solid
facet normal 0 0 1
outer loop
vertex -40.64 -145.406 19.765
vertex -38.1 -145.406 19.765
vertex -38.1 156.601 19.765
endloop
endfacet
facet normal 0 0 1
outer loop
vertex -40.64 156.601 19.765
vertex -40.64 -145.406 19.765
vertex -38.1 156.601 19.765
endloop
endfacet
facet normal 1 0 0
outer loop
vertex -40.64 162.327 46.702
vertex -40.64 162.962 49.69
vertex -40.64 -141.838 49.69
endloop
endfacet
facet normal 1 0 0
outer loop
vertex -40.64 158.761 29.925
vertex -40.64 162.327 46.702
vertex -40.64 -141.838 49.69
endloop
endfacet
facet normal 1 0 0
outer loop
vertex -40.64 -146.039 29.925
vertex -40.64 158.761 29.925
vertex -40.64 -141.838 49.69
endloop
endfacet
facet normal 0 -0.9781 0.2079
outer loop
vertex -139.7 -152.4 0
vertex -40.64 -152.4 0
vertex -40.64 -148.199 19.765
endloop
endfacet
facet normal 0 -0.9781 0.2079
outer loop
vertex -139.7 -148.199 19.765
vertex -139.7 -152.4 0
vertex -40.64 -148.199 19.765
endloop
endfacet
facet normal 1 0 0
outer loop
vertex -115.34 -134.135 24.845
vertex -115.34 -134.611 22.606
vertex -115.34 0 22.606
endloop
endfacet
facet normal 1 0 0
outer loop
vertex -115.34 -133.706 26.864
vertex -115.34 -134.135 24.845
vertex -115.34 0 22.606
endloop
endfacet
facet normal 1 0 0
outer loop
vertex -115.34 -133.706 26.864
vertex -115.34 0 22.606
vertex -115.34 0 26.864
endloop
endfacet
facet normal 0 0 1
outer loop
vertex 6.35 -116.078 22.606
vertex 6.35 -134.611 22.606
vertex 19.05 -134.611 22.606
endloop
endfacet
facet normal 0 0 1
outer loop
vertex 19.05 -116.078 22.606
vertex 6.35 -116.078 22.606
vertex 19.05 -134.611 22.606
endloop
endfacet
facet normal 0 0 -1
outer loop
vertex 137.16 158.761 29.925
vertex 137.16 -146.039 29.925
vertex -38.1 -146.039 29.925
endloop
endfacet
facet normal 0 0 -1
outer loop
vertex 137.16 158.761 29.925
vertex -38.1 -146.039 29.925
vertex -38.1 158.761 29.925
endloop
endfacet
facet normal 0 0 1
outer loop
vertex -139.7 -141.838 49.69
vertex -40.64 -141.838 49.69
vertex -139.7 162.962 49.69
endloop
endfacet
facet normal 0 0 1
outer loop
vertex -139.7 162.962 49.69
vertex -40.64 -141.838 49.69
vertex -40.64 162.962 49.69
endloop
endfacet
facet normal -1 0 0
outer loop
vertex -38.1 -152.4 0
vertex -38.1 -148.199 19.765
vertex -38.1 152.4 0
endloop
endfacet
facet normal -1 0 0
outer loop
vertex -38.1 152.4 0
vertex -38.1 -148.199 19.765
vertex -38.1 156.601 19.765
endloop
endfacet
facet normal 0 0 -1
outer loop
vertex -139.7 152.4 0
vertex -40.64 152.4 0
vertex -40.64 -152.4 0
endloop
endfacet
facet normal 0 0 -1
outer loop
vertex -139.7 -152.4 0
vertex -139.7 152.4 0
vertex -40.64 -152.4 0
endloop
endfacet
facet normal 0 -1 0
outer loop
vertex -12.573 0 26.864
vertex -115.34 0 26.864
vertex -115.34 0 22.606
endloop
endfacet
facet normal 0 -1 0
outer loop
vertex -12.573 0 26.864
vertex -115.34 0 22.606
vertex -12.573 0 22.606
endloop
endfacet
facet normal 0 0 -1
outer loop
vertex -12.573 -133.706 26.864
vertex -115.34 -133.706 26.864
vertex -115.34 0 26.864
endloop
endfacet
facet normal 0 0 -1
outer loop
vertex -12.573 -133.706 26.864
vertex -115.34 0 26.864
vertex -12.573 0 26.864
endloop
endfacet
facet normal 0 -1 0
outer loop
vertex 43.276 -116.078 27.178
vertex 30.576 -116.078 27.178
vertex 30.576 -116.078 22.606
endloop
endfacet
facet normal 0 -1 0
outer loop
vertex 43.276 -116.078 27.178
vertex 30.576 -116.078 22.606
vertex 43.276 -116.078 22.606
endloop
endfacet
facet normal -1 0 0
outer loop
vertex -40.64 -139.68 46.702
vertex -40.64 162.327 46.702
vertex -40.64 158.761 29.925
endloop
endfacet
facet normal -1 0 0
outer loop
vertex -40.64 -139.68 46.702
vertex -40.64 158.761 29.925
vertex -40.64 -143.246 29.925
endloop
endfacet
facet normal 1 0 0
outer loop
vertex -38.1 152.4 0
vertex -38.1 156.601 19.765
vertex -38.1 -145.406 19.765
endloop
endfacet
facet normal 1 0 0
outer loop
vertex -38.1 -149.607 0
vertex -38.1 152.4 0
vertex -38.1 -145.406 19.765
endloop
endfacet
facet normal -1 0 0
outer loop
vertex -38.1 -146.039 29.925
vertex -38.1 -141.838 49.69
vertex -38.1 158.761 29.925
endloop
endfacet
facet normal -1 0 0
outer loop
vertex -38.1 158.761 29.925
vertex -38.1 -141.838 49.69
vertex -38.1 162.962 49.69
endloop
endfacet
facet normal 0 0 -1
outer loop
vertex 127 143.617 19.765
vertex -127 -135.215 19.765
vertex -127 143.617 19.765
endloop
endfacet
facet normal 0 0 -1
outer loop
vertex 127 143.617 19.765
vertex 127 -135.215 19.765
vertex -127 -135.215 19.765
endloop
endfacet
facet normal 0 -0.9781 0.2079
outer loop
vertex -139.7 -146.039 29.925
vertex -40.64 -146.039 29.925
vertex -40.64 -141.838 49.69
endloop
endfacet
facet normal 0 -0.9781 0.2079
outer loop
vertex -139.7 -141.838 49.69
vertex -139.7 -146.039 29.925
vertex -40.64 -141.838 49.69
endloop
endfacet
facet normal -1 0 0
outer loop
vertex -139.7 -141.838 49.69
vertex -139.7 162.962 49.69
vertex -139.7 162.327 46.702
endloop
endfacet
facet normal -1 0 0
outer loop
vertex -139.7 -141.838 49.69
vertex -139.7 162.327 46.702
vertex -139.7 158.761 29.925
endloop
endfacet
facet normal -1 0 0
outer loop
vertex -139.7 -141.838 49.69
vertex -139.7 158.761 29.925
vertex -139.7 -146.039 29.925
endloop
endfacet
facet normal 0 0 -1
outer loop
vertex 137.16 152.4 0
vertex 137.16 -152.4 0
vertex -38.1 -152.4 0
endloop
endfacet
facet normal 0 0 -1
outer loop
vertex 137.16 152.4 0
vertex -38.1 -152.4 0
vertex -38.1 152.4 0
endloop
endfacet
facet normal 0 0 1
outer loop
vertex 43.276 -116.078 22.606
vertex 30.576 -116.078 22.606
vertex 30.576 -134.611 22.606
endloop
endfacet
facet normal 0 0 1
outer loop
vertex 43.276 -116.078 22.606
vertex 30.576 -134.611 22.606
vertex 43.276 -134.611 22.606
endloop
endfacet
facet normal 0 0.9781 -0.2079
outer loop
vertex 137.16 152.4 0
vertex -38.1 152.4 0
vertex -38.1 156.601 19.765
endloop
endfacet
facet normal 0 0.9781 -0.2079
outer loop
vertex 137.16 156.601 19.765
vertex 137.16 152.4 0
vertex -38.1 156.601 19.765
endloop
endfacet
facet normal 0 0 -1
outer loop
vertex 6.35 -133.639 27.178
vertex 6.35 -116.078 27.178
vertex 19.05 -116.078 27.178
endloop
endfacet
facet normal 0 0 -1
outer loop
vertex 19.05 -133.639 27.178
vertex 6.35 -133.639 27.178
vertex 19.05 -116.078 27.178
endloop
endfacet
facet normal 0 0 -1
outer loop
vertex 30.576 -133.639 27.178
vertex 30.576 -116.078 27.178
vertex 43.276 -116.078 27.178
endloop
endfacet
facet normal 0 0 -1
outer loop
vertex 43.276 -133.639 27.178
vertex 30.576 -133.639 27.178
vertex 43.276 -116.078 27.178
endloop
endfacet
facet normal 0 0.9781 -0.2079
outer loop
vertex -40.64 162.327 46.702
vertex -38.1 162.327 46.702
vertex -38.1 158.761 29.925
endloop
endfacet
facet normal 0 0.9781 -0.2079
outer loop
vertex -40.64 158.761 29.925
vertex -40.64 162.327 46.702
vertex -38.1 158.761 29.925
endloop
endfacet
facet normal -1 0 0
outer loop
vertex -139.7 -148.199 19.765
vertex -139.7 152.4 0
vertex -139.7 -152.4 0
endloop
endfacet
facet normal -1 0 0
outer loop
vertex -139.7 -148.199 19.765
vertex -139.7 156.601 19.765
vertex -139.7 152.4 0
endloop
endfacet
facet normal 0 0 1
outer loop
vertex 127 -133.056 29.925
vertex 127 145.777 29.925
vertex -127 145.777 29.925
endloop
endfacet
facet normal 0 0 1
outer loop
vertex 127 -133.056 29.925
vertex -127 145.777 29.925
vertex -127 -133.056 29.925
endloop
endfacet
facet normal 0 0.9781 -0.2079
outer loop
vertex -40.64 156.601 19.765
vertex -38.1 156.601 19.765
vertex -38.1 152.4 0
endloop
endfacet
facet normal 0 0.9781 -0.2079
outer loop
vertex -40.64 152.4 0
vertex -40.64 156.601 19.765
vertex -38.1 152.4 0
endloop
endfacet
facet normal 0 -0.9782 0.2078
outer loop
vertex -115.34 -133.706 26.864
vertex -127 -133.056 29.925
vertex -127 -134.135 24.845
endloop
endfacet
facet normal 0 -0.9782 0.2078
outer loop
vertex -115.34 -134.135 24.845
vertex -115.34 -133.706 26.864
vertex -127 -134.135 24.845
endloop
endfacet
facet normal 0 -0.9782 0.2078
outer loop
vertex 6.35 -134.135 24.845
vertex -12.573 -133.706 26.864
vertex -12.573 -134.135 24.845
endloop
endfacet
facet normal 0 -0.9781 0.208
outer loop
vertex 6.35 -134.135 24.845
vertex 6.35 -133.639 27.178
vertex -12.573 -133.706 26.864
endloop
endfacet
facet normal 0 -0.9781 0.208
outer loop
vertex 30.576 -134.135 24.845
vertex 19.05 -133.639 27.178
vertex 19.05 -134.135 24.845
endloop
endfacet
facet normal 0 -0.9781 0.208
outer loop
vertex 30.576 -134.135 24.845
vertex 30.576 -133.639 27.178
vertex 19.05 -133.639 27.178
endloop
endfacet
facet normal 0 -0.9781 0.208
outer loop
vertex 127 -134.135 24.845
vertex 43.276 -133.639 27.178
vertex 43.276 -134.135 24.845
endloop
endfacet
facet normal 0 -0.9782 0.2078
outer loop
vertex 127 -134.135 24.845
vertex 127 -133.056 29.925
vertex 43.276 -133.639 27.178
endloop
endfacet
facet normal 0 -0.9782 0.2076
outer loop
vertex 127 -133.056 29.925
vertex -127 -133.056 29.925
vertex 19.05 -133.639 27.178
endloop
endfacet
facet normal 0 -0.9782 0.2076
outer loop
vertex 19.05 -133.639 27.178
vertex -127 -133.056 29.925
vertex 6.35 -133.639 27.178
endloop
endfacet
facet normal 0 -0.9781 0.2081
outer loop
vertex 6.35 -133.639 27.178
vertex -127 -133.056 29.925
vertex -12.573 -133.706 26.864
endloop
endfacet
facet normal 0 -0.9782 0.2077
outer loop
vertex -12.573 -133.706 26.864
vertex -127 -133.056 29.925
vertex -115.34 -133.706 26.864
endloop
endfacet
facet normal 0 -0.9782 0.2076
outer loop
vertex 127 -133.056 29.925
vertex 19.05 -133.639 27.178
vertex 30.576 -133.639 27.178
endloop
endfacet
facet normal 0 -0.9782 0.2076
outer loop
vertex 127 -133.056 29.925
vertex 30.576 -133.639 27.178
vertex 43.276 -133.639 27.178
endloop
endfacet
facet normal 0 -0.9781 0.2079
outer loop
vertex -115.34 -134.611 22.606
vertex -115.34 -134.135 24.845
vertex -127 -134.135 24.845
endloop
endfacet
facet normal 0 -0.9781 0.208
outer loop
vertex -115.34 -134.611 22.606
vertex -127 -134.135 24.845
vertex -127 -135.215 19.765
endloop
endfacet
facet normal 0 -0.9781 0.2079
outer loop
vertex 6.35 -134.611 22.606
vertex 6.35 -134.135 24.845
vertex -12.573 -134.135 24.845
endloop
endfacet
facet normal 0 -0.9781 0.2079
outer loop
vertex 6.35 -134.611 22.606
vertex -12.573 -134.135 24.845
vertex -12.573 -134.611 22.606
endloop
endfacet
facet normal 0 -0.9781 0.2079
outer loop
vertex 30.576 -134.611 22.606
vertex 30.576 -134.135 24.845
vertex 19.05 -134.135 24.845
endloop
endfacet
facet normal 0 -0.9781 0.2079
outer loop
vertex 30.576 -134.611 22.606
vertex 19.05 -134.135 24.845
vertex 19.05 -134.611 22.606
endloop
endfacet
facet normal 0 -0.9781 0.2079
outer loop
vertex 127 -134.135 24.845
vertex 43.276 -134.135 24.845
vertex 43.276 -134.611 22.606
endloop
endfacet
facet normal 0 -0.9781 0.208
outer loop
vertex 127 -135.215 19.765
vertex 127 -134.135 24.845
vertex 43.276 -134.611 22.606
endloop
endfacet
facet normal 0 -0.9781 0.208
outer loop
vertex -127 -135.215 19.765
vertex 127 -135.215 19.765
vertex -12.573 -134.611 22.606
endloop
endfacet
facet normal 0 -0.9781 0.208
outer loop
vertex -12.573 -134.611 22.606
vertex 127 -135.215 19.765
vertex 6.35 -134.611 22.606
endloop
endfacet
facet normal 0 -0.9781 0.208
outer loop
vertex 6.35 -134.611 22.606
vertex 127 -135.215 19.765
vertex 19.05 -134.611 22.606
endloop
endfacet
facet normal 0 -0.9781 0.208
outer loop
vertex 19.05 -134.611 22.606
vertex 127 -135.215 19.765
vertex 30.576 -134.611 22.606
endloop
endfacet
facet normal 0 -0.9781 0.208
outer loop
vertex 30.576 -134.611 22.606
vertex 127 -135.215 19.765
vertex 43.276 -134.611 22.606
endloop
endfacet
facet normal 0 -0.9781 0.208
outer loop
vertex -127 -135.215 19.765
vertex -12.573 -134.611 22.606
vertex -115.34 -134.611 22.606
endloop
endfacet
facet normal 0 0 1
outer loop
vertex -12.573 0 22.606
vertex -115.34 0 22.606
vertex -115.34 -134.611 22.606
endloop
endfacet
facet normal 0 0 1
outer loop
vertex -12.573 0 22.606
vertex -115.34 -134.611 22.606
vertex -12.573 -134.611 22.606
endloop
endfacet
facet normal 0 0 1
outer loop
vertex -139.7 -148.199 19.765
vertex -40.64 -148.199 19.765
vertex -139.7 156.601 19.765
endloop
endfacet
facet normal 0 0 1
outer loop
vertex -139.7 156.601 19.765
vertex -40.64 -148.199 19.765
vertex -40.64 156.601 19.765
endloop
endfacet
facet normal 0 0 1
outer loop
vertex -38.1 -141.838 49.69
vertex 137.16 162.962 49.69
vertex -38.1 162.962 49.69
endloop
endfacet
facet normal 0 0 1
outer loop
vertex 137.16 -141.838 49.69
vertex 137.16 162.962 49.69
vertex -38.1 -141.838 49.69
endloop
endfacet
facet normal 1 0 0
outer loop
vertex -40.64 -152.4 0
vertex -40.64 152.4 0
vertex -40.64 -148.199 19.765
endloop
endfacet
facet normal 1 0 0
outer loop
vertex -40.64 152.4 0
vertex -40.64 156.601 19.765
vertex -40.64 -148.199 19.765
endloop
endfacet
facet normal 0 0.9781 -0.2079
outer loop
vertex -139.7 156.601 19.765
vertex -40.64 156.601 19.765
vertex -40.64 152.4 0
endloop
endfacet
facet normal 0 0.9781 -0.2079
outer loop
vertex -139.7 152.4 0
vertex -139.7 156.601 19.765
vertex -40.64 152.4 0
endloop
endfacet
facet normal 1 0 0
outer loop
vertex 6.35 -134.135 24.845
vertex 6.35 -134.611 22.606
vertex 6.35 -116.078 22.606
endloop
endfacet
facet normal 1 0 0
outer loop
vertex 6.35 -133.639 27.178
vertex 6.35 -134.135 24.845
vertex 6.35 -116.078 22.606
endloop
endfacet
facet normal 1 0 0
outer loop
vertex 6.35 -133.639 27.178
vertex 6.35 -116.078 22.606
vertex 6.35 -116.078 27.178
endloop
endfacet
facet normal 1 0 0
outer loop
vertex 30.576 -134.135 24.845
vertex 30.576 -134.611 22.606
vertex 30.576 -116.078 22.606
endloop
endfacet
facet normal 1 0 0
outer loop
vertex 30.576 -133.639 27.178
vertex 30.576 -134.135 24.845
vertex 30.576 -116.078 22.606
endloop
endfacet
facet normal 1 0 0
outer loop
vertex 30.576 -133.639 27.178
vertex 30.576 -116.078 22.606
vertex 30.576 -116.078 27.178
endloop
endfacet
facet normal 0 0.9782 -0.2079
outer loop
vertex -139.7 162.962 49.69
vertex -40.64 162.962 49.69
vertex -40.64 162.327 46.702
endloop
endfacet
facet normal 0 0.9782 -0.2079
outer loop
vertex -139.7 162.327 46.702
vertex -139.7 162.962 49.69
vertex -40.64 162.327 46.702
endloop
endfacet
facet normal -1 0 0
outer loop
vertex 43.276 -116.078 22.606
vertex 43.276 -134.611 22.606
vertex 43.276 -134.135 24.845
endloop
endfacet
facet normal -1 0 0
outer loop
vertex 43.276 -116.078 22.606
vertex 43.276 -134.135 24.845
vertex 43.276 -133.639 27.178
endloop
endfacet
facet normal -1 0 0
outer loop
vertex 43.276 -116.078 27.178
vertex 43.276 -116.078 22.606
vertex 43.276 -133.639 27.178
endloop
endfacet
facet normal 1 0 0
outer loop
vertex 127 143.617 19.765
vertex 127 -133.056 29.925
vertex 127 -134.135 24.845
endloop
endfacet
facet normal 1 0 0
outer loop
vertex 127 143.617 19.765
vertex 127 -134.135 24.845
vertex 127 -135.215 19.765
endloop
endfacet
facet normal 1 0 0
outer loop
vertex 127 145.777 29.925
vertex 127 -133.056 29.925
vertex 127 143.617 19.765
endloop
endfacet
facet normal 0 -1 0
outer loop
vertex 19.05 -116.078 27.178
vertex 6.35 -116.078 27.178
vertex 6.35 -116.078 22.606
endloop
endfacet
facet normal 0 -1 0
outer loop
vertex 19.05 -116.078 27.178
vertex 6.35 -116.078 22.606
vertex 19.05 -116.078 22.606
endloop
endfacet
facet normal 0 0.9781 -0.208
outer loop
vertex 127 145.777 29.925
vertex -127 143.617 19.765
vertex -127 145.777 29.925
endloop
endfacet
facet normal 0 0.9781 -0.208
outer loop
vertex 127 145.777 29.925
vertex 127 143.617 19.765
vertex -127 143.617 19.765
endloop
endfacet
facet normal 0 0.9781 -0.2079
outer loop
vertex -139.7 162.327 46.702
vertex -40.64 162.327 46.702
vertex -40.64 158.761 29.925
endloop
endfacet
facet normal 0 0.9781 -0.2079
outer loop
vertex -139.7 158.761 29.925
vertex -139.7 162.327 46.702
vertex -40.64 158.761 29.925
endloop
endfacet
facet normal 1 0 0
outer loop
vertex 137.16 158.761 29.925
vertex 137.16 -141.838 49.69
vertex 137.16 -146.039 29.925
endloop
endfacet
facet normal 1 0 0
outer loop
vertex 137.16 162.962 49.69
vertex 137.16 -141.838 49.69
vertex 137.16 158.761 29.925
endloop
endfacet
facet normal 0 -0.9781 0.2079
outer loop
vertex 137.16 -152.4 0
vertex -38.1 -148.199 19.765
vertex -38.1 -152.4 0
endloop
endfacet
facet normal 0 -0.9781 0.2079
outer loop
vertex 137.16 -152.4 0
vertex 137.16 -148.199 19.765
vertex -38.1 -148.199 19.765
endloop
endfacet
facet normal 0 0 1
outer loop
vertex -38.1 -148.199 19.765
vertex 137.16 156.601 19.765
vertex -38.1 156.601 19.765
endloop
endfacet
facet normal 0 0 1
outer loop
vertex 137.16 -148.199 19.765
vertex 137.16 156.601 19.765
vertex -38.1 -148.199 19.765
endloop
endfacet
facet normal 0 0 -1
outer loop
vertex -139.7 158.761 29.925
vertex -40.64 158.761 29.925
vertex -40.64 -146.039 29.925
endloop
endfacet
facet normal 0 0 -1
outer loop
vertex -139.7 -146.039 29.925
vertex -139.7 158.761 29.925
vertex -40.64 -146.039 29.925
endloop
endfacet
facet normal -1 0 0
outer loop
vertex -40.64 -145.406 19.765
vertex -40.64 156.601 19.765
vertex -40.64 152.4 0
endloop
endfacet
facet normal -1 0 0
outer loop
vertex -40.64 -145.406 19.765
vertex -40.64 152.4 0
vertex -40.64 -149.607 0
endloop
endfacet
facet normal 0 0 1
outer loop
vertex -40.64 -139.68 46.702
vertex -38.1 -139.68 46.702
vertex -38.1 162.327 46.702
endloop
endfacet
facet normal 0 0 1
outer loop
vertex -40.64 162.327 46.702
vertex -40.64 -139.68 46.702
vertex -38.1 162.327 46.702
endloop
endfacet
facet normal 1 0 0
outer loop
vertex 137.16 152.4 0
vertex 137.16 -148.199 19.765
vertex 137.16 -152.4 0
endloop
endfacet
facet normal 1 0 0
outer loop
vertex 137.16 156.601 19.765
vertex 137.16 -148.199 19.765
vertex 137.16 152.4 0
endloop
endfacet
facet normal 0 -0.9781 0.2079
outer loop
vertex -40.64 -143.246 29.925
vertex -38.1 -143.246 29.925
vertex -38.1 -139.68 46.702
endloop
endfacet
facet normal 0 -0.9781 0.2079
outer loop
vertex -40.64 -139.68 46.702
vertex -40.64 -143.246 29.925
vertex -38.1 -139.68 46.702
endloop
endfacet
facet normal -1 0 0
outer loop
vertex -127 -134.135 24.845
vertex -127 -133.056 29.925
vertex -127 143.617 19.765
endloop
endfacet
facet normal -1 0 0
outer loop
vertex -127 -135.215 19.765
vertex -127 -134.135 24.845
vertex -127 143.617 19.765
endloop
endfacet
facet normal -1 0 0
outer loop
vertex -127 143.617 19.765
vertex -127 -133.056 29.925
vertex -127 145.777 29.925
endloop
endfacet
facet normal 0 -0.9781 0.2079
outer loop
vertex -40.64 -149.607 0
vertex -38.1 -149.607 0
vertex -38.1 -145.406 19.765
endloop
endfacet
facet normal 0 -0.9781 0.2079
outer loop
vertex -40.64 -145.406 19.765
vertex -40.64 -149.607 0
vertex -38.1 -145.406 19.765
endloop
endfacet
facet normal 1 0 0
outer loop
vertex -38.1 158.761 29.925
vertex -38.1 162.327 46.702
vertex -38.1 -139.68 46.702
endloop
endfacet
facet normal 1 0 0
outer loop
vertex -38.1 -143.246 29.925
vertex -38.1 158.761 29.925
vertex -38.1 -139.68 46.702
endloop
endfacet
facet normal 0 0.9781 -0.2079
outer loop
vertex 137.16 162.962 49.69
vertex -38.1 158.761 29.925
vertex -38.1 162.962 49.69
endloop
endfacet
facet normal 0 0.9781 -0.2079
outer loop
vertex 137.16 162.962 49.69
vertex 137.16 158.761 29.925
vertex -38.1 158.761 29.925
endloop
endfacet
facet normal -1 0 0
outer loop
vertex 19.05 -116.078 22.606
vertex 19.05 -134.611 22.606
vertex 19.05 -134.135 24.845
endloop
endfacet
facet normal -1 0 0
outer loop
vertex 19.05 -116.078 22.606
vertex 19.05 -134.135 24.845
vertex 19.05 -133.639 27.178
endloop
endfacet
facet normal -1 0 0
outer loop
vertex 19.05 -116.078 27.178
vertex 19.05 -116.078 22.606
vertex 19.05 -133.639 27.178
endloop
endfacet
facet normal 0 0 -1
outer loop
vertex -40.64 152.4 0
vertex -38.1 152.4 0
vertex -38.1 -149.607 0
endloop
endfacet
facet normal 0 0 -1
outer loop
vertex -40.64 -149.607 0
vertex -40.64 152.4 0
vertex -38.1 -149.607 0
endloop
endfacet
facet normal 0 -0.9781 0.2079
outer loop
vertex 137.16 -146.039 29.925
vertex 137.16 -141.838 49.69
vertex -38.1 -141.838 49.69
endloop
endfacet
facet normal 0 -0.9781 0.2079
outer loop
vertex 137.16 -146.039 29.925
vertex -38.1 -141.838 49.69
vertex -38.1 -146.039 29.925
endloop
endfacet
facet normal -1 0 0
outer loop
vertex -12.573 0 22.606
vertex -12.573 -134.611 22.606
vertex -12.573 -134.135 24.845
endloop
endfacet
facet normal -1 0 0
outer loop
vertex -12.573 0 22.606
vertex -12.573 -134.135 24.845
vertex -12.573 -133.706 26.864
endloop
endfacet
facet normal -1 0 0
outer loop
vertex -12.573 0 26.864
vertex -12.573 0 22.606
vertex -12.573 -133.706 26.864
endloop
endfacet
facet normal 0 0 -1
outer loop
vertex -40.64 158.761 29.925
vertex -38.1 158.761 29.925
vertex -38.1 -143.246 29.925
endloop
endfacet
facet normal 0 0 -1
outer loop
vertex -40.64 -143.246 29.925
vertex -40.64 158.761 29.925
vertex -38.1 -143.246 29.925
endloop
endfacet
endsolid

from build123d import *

# Parameters (mm, degrees)
F1_DEPTH       = 137.16
F1_DEPTH_BACK  = 38.1
F2_DEPTH       = 127
F2_DEPTH_BACK  = 127
F4_DEPTH       = 2.54
F6_DEPTH       = 99.06
F7_W           = 102.7665138245
F7_H           = 4.2582950555
F8_DEPTH       = 152.4
F10_W          = 12.7
F10_H          = 4.572
F11_DEPTH      = 6.35
F11_DEPTH_BACK = 12.7


with BuildPart() as f1:
    # F0 (on Right) → F1 (new body, two sides)
    with BuildSketch(Plane.YZ) as f1_sk:
        Polygon((162.9619138935, 49.6898981173), (-141.8380861065, 49.6898981173), (-146.0392557199, 29.9249490586), (-133.0555301652, 29.9249490586), (0, 29.9249490586), (145.7770187253, 29.9249490586), (158.7607442801, 29.9249490586), align=None)
    extrude(amount=F1_DEPTH)
    extrude(f1_sk.sketch, amount=-F1_DEPTH_BACK)


with BuildPart() as f1b:
    # F0 (on Right) → F1, piece 2 (new body, two sides)
    with BuildSketch(Plane.YZ) as f1_2_sk:
        Polygon((-135.2151048317, 19.7649490586), (-148.1988303865, 19.7649490586), (-152.4, 0), (152.4, 0), (156.6011696135, 19.7649490586), (143.6174440587, 19.7649490586), (0, 19.7649490586), align=None)
    extrude(amount=F1_DEPTH)
    extrude(f1_2_sk.sketch, amount=-F1_DEPTH_BACK)


with BuildPart() as f2:
    # F0 (on Right) → F2 (new body, two sides)
    with BuildSketch(Plane.YZ) as f2_sk:
        Polygon((143.6174440587, 19.7649490586), (144.697231392, 24.8449490586), (0, 24.8449490586), (0, 19.7649490586), align=None)
        Polygon((144.697231392, 24.8449490586), (145.7770187253, 29.9249490586), (0, 29.9249490586), (0, 24.8449490586), align=None)
        Polygon((0, 24.8449490586), (-134.1353174984, 24.8449490586), (-135.2151048317, 19.7649490586), (0, 19.7649490586), align=None)
        Polygon((0, 29.9249490586), (-133.0555301652, 29.9249490586), (-134.1353174984, 24.8449490586), (0, 24.8449490586), align=None)
    extrude(amount=F2_DEPTH)
    extrude(f2_sk.sketch, amount=-F2_DEPTH_BACK)

    # F7 (on Front) → F8 (cut)
    with BuildSketch(Plane.XZ):
        with Locations((-63.9565065503, 24.7351552825)):
            Rectangle(F7_W, F7_H)
    extrude(amount=F8_DEPTH, mode=Mode.SUBTRACT)

    # F10 (on offset) → F11 (cut, two sides)
    with BuildSketch(Plane.XZ.offset(122.428)) as f11_sk:
        with Locations((12.7, 24.8920077548)):
            Rectangle(F10_W, F10_H)
        with Locations((36.9256554008, 24.8920077548)):
            Rectangle(F10_W, F10_H)
    extrude(amount=-F11_DEPTH, mode=Mode.SUBTRACT)
    extrude(f11_sk.sketch, amount=F11_DEPTH_BACK, mode=Mode.SUBTRACT)


with BuildPart() as f4:
    # F3 (on face) → F4 (new body)
    with BuildSketch(Plane(origin=(-38.1, 0, 0), x_dir=(0, -1, 0), z_dir=(-1, 0, 0))):
        Polygon((139.6802159434, 46.7018868242), (-162.3267924868, 46.7018868242), (-158.7607442801, 29.9249490586), (143.2462641502, 29.9249490586), align=None)
    extrude(amount=F4_DEPTH)


with BuildPart() as f4b:
    # F3 (on face) → F4, piece 2 (new body)
    with BuildSketch(Plane(origin=(-38.1, 0, 0), x_dir=(0, -1, 0), z_dir=(-1, 0, 0))):
        Polygon((145.4058388168, 19.7649490586), (-156.6011696135, 19.7649490586), (-152.4, 0), (149.6070084303, 0), align=None)
    extrude(amount=F4_DEPTH)


with BuildPart() as f6:
    # F5 (on face) → F6 (new body)
    with BuildSketch(Plane(origin=(-40.64, 0, 0), x_dir=(0, -1, 0), z_dir=(-1, 0, 0))):
        Polygon((143.2462641502, 29.9249490586), (146.0392557199, 29.9249490586), (141.8380861065, 49.6898981173), (-162.9619138935, 49.6898981173), (-162.3267924868, 46.7018868242), (139.6802159434, 46.7018868242), align=None)
        Polygon((-158.7607442801, 29.9249490586), (143.2462641502, 29.9249490586), (139.6802159434, 46.7018868242), (-162.3267924868, 46.7018868242), align=None)
    extrude(amount=F6_DEPTH)


with BuildPart() as f6b:
    # F5 (on face) → F6, piece 2 (new body)
    with BuildSketch(Plane(origin=(-40.64, 0, 0), x_dir=(0, -1, 0), z_dir=(-1, 0, 0))):
        Polygon((-152.4, 0), (152.4, 0), (148.1988303865, 19.7649490586), (-156.6011696135, 19.7649490586), align=None)
    extrude(amount=F6_DEPTH)


solid = Compound([f1.part, f1b.part, f2.part, f4.part, f4b.part, f6.part, f6b.part])
